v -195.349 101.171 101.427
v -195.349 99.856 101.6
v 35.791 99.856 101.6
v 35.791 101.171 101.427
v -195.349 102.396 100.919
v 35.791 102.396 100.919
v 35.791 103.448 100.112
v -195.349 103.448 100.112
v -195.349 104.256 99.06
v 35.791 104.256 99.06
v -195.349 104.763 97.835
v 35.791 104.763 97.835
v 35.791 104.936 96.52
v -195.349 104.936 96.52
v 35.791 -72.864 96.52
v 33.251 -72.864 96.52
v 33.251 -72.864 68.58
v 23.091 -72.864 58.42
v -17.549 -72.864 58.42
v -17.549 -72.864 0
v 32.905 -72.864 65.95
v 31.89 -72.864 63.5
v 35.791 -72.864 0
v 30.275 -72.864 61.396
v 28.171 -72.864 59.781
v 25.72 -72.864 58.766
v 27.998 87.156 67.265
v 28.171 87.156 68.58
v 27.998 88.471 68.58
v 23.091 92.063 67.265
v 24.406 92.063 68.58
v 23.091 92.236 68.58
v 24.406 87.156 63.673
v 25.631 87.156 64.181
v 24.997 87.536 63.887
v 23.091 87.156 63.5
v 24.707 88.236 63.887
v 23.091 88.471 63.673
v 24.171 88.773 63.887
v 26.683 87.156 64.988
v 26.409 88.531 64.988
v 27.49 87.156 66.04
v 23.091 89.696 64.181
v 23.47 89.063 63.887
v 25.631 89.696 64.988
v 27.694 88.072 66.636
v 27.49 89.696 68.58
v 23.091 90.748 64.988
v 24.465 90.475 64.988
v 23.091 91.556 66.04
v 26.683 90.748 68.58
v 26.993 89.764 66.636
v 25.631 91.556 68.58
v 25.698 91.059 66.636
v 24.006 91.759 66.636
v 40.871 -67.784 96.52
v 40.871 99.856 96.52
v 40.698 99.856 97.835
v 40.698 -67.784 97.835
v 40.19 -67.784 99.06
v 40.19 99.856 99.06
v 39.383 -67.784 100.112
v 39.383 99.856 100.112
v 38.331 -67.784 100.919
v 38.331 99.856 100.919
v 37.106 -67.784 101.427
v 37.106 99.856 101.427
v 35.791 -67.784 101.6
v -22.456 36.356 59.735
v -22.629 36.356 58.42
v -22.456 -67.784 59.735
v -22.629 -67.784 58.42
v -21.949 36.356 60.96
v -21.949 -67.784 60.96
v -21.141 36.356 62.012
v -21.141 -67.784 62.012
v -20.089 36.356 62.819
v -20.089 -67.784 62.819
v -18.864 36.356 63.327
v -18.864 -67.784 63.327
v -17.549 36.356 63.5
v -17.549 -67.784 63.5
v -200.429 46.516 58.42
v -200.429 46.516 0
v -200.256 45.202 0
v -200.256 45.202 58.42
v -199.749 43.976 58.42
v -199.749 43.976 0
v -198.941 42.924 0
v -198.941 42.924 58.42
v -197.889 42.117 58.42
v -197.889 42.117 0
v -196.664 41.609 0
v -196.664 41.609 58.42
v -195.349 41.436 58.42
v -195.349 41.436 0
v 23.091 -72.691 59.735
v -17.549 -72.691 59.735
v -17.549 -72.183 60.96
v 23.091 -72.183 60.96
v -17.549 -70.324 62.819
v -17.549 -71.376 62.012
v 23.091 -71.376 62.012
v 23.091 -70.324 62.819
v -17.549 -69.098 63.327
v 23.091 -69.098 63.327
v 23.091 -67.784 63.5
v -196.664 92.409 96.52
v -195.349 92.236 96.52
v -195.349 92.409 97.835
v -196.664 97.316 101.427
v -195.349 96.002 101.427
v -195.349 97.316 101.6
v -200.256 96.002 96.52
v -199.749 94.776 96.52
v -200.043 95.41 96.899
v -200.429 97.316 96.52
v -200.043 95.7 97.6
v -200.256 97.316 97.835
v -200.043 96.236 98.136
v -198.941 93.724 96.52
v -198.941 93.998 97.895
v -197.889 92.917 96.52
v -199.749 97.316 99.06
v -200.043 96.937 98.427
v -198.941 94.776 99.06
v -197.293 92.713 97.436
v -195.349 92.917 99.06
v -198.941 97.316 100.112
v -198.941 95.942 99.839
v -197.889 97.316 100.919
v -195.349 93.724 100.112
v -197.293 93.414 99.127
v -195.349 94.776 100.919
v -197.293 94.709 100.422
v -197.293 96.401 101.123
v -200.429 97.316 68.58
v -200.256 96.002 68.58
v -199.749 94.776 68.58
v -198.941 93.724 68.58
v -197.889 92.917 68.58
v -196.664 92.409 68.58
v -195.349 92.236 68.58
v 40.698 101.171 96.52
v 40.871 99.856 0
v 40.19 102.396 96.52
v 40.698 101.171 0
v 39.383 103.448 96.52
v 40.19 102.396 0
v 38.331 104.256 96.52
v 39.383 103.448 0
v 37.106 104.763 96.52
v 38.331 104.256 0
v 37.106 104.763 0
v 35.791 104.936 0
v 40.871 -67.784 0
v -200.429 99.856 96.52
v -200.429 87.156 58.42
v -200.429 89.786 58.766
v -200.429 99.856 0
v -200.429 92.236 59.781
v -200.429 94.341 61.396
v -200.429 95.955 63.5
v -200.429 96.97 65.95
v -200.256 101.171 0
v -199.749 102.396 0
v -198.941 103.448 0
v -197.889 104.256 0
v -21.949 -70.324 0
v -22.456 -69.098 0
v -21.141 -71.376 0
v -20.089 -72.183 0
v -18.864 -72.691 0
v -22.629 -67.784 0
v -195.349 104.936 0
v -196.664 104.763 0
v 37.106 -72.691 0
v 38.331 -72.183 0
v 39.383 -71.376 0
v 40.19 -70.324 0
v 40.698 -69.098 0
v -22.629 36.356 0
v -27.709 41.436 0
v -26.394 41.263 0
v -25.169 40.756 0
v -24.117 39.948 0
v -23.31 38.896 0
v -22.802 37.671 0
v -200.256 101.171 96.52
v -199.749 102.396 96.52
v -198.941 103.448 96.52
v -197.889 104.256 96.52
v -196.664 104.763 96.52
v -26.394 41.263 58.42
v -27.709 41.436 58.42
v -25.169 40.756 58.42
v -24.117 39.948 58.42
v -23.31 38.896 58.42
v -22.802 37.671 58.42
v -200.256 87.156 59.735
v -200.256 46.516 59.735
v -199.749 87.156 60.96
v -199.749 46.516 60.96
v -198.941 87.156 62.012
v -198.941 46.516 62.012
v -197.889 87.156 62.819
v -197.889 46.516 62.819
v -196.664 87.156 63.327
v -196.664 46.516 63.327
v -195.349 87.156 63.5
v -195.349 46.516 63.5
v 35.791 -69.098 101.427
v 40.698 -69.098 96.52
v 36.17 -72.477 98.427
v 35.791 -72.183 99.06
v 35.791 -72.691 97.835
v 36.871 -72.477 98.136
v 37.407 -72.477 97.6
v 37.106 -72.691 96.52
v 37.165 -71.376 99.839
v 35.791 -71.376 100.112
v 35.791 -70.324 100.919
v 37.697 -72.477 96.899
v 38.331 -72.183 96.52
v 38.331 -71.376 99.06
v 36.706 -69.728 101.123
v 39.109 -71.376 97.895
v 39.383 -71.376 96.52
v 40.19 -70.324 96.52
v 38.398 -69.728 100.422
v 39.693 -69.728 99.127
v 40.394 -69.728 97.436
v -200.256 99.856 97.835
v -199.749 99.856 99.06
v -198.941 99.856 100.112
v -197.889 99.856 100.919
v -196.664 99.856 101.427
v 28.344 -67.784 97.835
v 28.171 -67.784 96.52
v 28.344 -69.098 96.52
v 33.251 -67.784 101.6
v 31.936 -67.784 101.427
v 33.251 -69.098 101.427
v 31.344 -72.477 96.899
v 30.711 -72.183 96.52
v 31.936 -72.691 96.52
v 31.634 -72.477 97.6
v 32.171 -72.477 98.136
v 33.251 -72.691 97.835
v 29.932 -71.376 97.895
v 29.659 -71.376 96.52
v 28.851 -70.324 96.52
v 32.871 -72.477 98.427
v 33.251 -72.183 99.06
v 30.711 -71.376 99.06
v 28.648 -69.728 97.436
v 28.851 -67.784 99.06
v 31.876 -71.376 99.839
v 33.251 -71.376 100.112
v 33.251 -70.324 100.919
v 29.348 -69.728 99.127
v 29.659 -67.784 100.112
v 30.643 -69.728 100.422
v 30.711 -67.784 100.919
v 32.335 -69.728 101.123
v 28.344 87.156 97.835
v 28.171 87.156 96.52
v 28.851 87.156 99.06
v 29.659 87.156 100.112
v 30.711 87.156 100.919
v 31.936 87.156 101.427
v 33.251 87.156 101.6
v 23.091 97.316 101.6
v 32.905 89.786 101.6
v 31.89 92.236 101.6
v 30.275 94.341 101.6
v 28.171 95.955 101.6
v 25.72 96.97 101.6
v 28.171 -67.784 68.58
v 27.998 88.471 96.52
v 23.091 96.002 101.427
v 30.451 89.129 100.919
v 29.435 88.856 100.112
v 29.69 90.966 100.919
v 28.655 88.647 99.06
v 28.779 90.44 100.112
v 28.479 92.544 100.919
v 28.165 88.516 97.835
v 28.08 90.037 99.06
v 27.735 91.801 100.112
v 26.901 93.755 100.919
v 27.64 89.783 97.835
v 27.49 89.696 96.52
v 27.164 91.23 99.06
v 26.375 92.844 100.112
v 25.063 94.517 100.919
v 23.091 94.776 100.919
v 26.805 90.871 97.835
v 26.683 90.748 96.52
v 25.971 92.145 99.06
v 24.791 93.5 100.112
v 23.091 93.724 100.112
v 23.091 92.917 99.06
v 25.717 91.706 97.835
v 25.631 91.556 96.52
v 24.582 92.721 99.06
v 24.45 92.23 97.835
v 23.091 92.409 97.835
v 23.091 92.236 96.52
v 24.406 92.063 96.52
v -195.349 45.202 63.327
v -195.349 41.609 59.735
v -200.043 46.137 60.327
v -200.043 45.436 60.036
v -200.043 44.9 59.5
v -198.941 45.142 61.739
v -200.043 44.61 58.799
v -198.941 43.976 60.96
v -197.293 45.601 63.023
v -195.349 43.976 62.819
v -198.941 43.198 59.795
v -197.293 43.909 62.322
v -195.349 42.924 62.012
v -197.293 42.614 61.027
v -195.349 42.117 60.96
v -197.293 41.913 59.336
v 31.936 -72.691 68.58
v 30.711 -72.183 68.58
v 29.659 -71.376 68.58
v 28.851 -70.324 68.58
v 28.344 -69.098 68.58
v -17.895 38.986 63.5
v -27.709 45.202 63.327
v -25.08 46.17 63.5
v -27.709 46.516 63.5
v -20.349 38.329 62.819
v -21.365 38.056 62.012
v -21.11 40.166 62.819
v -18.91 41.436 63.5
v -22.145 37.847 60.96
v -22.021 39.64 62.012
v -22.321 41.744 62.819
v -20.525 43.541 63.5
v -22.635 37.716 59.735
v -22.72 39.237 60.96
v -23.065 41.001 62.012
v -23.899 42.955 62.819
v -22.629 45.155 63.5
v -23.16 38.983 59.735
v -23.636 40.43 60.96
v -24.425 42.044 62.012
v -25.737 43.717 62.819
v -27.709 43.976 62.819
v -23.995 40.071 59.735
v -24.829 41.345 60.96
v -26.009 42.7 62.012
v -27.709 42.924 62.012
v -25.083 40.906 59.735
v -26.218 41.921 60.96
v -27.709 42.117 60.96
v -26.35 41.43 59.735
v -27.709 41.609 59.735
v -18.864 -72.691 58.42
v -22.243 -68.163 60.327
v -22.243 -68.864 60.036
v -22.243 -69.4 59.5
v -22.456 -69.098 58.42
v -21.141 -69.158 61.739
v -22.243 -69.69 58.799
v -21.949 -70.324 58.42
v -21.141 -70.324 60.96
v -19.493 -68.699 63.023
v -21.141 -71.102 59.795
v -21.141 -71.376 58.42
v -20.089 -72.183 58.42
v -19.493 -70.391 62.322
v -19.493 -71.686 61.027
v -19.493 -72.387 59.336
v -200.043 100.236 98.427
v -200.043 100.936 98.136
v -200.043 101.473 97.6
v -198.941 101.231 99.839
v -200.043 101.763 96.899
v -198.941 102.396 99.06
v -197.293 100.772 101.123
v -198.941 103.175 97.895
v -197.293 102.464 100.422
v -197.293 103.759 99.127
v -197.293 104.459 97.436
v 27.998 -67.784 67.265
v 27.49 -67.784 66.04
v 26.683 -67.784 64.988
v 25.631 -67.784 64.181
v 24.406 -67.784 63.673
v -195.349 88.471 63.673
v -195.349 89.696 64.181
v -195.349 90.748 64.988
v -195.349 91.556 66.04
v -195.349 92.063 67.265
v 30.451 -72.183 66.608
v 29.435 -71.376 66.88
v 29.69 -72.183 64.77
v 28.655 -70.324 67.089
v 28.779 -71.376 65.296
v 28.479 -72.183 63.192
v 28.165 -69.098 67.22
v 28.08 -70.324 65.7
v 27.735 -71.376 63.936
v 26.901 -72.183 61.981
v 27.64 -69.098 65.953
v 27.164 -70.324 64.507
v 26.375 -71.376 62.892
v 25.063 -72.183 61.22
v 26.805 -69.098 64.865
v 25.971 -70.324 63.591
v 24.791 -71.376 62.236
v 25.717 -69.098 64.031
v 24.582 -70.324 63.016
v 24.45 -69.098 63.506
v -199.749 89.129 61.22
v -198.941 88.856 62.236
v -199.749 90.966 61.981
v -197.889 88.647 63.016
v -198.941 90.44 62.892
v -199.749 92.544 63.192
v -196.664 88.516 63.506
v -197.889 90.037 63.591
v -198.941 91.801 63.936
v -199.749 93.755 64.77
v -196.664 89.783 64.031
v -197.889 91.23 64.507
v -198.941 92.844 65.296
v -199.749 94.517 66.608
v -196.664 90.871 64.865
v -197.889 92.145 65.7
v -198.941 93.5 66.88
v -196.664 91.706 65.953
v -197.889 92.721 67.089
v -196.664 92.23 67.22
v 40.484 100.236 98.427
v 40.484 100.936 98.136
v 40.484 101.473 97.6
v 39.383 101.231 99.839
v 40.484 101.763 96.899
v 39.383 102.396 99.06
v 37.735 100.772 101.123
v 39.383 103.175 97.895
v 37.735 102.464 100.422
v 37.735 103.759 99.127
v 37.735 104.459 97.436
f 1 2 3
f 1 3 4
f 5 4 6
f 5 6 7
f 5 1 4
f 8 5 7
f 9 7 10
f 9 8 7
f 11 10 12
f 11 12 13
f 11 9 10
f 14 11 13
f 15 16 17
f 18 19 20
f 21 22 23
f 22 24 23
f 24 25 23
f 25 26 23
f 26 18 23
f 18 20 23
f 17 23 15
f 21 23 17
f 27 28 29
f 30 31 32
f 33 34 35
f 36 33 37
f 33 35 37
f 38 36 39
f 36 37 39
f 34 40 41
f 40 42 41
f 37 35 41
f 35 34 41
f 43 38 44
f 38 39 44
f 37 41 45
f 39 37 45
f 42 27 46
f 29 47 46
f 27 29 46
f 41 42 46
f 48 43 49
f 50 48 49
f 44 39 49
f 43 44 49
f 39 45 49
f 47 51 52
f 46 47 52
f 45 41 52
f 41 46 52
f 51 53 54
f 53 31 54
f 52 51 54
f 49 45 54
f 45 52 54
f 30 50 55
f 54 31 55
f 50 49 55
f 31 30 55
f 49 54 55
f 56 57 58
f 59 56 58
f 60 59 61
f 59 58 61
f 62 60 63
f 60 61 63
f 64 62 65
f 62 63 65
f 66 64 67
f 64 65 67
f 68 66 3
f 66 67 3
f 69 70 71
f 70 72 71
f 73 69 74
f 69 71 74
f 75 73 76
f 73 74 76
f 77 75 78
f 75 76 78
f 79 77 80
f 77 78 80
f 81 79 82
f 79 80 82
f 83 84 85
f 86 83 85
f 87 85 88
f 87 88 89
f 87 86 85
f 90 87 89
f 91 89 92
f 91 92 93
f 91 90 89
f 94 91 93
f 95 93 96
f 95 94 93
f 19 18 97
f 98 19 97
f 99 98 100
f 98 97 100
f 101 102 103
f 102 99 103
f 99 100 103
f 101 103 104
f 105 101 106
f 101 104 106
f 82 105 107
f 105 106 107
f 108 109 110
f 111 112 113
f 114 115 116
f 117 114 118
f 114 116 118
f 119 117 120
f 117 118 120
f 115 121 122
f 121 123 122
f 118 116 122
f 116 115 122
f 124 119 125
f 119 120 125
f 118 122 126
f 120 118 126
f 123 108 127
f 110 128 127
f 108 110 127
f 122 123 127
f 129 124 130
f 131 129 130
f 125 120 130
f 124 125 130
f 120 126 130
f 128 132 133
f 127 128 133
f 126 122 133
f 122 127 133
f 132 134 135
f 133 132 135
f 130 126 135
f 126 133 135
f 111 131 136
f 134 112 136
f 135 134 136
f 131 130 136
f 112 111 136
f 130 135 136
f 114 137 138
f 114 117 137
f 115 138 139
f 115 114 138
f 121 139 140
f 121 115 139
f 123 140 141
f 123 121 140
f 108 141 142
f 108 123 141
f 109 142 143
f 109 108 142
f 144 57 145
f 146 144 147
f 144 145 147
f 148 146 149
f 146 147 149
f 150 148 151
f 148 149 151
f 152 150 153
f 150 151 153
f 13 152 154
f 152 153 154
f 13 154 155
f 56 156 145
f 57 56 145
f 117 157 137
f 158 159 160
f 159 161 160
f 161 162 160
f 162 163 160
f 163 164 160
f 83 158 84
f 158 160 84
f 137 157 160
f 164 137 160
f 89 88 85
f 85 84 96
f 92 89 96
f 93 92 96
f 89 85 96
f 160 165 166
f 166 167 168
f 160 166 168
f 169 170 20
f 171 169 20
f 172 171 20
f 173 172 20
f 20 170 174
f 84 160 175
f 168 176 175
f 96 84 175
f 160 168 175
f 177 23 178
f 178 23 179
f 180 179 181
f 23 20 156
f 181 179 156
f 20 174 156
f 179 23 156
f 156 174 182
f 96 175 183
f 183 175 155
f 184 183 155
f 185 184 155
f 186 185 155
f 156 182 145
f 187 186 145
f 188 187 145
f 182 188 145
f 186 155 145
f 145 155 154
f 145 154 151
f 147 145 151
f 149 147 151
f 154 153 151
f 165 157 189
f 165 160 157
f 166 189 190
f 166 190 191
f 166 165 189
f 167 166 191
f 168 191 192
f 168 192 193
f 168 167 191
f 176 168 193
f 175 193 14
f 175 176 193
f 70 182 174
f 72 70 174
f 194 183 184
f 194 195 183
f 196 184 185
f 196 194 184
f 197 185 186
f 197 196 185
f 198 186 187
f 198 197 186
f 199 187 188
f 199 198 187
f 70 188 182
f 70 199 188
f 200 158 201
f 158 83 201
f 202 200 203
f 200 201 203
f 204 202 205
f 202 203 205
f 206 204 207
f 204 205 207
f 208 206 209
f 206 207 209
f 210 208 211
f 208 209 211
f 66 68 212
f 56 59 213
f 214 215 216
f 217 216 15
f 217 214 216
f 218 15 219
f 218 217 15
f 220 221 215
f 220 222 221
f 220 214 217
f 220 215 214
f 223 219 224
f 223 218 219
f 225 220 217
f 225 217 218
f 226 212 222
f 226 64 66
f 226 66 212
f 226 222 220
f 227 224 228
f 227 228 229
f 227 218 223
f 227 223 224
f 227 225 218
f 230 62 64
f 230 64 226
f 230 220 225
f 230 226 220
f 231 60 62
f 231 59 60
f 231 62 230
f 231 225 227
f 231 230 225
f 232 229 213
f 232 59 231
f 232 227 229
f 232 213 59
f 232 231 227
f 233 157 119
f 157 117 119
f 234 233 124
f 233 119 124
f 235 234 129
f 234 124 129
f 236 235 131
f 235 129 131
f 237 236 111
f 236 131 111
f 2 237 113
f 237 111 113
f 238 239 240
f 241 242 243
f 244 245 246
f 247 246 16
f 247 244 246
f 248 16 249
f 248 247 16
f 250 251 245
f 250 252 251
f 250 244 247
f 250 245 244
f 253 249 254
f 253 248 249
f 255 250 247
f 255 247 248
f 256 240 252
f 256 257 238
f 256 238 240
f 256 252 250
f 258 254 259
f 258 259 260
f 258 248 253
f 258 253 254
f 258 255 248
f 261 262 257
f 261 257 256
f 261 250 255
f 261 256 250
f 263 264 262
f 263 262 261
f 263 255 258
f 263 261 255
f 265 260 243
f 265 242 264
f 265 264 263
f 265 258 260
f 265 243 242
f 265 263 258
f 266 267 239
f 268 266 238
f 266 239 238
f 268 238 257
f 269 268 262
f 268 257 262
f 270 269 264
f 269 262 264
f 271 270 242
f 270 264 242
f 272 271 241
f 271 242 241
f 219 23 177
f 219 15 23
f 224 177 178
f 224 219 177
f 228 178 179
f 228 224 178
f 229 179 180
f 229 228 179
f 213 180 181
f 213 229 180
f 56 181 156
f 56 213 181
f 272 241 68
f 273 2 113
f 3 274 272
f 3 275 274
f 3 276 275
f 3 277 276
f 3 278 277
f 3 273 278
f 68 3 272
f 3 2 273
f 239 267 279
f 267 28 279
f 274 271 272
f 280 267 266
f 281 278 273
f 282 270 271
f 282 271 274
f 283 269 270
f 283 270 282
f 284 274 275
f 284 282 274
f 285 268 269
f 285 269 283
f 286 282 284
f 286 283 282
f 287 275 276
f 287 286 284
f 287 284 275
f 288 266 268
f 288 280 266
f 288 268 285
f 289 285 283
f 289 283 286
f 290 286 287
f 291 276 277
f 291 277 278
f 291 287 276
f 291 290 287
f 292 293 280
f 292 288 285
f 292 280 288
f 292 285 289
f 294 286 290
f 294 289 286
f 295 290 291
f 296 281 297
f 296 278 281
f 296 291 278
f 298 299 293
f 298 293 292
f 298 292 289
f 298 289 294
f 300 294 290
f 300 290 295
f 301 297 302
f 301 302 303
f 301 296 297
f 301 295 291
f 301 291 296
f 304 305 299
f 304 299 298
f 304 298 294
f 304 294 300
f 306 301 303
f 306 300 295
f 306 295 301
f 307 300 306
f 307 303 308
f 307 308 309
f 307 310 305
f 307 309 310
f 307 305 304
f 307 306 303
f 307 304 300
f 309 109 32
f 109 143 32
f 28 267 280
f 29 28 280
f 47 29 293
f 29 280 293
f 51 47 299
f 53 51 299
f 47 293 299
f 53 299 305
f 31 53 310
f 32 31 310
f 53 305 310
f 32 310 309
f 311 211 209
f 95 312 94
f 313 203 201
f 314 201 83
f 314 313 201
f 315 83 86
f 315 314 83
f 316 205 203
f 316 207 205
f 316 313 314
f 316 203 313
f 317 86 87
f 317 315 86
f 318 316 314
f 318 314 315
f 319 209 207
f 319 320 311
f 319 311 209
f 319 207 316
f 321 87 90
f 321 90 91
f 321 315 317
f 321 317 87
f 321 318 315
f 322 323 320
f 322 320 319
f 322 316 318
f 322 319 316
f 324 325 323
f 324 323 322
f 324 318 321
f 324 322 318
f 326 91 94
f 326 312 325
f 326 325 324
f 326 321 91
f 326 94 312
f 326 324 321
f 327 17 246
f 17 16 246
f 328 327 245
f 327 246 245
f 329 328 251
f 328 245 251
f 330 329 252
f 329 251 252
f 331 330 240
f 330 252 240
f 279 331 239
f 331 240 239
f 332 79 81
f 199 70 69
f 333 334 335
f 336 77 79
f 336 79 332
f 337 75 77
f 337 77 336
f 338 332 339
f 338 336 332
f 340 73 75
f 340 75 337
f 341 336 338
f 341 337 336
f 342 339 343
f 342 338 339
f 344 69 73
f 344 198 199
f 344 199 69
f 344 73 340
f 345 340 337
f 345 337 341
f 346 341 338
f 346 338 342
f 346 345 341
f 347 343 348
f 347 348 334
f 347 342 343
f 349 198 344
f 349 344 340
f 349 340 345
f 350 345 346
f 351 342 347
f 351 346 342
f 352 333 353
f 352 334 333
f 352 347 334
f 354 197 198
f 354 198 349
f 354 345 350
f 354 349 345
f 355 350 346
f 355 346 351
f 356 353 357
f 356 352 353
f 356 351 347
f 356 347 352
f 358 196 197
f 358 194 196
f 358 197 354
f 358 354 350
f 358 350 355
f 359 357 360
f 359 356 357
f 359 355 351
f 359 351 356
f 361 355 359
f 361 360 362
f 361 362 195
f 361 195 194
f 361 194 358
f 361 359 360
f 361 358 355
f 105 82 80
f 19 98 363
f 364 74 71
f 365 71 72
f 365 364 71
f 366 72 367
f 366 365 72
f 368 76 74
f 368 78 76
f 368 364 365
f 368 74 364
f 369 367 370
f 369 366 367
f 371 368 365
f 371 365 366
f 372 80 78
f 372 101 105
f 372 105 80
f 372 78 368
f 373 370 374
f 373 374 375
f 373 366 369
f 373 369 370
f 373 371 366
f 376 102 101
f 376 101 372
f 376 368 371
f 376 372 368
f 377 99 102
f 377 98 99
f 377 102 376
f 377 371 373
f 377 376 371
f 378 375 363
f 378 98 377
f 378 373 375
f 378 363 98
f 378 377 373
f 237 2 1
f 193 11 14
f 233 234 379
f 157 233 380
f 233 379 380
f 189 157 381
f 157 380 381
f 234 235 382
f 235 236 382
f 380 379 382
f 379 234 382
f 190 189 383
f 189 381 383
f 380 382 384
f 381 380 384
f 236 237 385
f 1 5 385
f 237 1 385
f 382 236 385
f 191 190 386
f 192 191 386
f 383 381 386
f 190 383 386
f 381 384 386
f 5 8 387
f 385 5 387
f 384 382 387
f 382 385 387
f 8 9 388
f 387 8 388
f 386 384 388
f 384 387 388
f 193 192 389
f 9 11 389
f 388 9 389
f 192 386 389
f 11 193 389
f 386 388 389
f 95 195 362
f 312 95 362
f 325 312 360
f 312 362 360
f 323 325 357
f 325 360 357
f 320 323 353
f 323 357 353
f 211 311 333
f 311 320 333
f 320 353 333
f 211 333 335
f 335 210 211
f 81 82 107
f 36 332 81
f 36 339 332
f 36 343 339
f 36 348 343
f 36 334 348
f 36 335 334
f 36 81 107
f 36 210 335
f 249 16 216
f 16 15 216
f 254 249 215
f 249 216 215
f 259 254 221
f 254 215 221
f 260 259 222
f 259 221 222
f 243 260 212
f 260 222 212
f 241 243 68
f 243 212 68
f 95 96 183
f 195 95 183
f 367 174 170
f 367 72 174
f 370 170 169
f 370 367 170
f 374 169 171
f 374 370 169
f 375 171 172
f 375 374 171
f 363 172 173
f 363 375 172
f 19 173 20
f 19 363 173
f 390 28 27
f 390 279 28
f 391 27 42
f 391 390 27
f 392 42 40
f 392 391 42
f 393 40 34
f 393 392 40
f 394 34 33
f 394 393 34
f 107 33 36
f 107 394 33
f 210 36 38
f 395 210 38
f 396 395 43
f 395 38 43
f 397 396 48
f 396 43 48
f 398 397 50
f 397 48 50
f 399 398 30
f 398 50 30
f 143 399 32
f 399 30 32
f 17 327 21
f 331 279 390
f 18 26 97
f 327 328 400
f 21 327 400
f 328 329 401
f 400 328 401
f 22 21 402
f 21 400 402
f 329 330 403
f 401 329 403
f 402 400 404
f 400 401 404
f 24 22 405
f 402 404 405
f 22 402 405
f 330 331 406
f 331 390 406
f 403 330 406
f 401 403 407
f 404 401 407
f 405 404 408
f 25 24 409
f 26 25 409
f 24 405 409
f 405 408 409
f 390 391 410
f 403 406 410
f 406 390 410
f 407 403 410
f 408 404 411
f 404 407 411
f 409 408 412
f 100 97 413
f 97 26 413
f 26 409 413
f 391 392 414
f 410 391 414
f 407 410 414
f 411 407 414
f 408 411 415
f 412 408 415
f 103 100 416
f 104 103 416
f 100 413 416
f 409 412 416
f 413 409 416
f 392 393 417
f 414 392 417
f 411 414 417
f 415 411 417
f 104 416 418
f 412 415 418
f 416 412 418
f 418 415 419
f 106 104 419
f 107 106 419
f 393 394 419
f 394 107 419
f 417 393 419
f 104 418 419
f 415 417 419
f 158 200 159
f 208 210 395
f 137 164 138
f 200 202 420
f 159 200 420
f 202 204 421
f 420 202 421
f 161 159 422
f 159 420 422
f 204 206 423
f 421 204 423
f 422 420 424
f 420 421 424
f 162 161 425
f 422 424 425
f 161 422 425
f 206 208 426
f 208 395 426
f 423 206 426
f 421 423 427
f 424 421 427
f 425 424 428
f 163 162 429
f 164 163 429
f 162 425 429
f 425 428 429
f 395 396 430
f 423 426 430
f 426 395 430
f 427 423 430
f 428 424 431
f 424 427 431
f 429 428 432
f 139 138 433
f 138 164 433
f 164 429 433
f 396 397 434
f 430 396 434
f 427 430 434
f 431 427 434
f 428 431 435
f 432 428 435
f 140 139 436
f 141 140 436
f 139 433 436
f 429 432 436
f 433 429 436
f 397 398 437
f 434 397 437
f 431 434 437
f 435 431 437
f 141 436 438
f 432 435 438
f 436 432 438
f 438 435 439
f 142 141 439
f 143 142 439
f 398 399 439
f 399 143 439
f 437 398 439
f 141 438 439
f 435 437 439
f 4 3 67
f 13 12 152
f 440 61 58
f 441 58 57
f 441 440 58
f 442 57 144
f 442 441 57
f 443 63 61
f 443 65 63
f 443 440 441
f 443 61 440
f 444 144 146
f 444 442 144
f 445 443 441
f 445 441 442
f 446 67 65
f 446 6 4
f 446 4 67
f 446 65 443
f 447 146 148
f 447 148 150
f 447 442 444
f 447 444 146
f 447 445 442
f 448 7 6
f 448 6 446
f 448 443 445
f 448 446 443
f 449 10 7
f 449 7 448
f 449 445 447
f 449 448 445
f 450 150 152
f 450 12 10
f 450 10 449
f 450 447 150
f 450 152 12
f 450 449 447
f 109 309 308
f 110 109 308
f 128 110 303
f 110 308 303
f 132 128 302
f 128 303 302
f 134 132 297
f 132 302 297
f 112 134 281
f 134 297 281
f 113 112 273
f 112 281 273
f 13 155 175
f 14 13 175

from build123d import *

# Parameters (mm, degrees)
F1_DEPTH = 101.6
F2_DEPTH = 63.5
F3_R     = 5.08


with BuildPart() as f1:
    # F0 (on Top) → F1 (new body)
    with BuildSketch(Plane.XY):
        Polygon((28.1707099802, 104.9363430021), (-200.4292900198, 104.9363430021), (-200.4292900198, 92.2363430021), (28.1707099802, 92.2363430021), (28.1707099802, -72.8636569979), (40.8707099802, -72.8636569979), (40.8707099802, 41.4363430021), (40.8707099802, 92.2363430021), (40.8707099802, 104.9363430021), align=None)
    extrude(amount=F1_DEPTH)

    # F0 (on Top) → F2 (join)
    with BuildSketch(Plane.XY):
        Polygon((28.1707099802, 104.9363430021), (-200.4292900198, 104.9363430021), (-200.4292900198, 92.2363430021), (28.1707099802, 92.2363430021), (28.1707099802, -72.8636569979), (40.8707099802, -72.8636569979), (40.8707099802, 41.4363430021), (40.8707099802, 92.2363430021), (40.8707099802, 104.9363430021), align=None)
        Polygon((28.1707099802, 92.2363430021), (-200.4292900198, 92.2363430021), (-200.4292900198, 41.4363430021), (-22.6292900198, 41.4363430021), (-22.6292900198, -72.8636569979), (28.1707099802, -72.8636569979), align=None)
    extrude(amount=F2_DEPTH)

    # F3
    f3_edges = [f1.edges().sort_by_distance(p)[0] for p in [
        (28.17071, 9.686343, 101.6),
        (-86.12929, 92.236343, 101.6),
        (28.17071, 92.236343, 82.55),
        (28.17071, 9.686343, 63.5),
        (28.17071, -72.863657, 82.55),
        (-200.42929, 92.236343, 82.55),
        (-86.12929, 92.236343, 63.5),
        (2.77071, -72.863657, 63.5),
        (-22.62929, -15.713657, 63.5),
        (-111.52929, 41.436343, 63.5),
        (-200.42929, 66.836343, 63.5),
        (-22.62929, 41.436343, 31.75),
        (-200.42929, 41.436343, 31.75),
        (-79.77929, 104.936343, 101.6),
        (40.87071, 16.036343, 101.6),
        (34.52071, -72.863657, 101.6),
        (-200.42929, 98.586343, 101.6),
        (-22.62929, -72.863657, 31.75),
        (-200.42929, 104.936343, 50.8),
        (40.87071, -72.863657, 50.8),
        (40.87071, 104.936343, 50.8),
    ]]
    fillet(f3_edges, radius=F3_R)


solid = f1.part
